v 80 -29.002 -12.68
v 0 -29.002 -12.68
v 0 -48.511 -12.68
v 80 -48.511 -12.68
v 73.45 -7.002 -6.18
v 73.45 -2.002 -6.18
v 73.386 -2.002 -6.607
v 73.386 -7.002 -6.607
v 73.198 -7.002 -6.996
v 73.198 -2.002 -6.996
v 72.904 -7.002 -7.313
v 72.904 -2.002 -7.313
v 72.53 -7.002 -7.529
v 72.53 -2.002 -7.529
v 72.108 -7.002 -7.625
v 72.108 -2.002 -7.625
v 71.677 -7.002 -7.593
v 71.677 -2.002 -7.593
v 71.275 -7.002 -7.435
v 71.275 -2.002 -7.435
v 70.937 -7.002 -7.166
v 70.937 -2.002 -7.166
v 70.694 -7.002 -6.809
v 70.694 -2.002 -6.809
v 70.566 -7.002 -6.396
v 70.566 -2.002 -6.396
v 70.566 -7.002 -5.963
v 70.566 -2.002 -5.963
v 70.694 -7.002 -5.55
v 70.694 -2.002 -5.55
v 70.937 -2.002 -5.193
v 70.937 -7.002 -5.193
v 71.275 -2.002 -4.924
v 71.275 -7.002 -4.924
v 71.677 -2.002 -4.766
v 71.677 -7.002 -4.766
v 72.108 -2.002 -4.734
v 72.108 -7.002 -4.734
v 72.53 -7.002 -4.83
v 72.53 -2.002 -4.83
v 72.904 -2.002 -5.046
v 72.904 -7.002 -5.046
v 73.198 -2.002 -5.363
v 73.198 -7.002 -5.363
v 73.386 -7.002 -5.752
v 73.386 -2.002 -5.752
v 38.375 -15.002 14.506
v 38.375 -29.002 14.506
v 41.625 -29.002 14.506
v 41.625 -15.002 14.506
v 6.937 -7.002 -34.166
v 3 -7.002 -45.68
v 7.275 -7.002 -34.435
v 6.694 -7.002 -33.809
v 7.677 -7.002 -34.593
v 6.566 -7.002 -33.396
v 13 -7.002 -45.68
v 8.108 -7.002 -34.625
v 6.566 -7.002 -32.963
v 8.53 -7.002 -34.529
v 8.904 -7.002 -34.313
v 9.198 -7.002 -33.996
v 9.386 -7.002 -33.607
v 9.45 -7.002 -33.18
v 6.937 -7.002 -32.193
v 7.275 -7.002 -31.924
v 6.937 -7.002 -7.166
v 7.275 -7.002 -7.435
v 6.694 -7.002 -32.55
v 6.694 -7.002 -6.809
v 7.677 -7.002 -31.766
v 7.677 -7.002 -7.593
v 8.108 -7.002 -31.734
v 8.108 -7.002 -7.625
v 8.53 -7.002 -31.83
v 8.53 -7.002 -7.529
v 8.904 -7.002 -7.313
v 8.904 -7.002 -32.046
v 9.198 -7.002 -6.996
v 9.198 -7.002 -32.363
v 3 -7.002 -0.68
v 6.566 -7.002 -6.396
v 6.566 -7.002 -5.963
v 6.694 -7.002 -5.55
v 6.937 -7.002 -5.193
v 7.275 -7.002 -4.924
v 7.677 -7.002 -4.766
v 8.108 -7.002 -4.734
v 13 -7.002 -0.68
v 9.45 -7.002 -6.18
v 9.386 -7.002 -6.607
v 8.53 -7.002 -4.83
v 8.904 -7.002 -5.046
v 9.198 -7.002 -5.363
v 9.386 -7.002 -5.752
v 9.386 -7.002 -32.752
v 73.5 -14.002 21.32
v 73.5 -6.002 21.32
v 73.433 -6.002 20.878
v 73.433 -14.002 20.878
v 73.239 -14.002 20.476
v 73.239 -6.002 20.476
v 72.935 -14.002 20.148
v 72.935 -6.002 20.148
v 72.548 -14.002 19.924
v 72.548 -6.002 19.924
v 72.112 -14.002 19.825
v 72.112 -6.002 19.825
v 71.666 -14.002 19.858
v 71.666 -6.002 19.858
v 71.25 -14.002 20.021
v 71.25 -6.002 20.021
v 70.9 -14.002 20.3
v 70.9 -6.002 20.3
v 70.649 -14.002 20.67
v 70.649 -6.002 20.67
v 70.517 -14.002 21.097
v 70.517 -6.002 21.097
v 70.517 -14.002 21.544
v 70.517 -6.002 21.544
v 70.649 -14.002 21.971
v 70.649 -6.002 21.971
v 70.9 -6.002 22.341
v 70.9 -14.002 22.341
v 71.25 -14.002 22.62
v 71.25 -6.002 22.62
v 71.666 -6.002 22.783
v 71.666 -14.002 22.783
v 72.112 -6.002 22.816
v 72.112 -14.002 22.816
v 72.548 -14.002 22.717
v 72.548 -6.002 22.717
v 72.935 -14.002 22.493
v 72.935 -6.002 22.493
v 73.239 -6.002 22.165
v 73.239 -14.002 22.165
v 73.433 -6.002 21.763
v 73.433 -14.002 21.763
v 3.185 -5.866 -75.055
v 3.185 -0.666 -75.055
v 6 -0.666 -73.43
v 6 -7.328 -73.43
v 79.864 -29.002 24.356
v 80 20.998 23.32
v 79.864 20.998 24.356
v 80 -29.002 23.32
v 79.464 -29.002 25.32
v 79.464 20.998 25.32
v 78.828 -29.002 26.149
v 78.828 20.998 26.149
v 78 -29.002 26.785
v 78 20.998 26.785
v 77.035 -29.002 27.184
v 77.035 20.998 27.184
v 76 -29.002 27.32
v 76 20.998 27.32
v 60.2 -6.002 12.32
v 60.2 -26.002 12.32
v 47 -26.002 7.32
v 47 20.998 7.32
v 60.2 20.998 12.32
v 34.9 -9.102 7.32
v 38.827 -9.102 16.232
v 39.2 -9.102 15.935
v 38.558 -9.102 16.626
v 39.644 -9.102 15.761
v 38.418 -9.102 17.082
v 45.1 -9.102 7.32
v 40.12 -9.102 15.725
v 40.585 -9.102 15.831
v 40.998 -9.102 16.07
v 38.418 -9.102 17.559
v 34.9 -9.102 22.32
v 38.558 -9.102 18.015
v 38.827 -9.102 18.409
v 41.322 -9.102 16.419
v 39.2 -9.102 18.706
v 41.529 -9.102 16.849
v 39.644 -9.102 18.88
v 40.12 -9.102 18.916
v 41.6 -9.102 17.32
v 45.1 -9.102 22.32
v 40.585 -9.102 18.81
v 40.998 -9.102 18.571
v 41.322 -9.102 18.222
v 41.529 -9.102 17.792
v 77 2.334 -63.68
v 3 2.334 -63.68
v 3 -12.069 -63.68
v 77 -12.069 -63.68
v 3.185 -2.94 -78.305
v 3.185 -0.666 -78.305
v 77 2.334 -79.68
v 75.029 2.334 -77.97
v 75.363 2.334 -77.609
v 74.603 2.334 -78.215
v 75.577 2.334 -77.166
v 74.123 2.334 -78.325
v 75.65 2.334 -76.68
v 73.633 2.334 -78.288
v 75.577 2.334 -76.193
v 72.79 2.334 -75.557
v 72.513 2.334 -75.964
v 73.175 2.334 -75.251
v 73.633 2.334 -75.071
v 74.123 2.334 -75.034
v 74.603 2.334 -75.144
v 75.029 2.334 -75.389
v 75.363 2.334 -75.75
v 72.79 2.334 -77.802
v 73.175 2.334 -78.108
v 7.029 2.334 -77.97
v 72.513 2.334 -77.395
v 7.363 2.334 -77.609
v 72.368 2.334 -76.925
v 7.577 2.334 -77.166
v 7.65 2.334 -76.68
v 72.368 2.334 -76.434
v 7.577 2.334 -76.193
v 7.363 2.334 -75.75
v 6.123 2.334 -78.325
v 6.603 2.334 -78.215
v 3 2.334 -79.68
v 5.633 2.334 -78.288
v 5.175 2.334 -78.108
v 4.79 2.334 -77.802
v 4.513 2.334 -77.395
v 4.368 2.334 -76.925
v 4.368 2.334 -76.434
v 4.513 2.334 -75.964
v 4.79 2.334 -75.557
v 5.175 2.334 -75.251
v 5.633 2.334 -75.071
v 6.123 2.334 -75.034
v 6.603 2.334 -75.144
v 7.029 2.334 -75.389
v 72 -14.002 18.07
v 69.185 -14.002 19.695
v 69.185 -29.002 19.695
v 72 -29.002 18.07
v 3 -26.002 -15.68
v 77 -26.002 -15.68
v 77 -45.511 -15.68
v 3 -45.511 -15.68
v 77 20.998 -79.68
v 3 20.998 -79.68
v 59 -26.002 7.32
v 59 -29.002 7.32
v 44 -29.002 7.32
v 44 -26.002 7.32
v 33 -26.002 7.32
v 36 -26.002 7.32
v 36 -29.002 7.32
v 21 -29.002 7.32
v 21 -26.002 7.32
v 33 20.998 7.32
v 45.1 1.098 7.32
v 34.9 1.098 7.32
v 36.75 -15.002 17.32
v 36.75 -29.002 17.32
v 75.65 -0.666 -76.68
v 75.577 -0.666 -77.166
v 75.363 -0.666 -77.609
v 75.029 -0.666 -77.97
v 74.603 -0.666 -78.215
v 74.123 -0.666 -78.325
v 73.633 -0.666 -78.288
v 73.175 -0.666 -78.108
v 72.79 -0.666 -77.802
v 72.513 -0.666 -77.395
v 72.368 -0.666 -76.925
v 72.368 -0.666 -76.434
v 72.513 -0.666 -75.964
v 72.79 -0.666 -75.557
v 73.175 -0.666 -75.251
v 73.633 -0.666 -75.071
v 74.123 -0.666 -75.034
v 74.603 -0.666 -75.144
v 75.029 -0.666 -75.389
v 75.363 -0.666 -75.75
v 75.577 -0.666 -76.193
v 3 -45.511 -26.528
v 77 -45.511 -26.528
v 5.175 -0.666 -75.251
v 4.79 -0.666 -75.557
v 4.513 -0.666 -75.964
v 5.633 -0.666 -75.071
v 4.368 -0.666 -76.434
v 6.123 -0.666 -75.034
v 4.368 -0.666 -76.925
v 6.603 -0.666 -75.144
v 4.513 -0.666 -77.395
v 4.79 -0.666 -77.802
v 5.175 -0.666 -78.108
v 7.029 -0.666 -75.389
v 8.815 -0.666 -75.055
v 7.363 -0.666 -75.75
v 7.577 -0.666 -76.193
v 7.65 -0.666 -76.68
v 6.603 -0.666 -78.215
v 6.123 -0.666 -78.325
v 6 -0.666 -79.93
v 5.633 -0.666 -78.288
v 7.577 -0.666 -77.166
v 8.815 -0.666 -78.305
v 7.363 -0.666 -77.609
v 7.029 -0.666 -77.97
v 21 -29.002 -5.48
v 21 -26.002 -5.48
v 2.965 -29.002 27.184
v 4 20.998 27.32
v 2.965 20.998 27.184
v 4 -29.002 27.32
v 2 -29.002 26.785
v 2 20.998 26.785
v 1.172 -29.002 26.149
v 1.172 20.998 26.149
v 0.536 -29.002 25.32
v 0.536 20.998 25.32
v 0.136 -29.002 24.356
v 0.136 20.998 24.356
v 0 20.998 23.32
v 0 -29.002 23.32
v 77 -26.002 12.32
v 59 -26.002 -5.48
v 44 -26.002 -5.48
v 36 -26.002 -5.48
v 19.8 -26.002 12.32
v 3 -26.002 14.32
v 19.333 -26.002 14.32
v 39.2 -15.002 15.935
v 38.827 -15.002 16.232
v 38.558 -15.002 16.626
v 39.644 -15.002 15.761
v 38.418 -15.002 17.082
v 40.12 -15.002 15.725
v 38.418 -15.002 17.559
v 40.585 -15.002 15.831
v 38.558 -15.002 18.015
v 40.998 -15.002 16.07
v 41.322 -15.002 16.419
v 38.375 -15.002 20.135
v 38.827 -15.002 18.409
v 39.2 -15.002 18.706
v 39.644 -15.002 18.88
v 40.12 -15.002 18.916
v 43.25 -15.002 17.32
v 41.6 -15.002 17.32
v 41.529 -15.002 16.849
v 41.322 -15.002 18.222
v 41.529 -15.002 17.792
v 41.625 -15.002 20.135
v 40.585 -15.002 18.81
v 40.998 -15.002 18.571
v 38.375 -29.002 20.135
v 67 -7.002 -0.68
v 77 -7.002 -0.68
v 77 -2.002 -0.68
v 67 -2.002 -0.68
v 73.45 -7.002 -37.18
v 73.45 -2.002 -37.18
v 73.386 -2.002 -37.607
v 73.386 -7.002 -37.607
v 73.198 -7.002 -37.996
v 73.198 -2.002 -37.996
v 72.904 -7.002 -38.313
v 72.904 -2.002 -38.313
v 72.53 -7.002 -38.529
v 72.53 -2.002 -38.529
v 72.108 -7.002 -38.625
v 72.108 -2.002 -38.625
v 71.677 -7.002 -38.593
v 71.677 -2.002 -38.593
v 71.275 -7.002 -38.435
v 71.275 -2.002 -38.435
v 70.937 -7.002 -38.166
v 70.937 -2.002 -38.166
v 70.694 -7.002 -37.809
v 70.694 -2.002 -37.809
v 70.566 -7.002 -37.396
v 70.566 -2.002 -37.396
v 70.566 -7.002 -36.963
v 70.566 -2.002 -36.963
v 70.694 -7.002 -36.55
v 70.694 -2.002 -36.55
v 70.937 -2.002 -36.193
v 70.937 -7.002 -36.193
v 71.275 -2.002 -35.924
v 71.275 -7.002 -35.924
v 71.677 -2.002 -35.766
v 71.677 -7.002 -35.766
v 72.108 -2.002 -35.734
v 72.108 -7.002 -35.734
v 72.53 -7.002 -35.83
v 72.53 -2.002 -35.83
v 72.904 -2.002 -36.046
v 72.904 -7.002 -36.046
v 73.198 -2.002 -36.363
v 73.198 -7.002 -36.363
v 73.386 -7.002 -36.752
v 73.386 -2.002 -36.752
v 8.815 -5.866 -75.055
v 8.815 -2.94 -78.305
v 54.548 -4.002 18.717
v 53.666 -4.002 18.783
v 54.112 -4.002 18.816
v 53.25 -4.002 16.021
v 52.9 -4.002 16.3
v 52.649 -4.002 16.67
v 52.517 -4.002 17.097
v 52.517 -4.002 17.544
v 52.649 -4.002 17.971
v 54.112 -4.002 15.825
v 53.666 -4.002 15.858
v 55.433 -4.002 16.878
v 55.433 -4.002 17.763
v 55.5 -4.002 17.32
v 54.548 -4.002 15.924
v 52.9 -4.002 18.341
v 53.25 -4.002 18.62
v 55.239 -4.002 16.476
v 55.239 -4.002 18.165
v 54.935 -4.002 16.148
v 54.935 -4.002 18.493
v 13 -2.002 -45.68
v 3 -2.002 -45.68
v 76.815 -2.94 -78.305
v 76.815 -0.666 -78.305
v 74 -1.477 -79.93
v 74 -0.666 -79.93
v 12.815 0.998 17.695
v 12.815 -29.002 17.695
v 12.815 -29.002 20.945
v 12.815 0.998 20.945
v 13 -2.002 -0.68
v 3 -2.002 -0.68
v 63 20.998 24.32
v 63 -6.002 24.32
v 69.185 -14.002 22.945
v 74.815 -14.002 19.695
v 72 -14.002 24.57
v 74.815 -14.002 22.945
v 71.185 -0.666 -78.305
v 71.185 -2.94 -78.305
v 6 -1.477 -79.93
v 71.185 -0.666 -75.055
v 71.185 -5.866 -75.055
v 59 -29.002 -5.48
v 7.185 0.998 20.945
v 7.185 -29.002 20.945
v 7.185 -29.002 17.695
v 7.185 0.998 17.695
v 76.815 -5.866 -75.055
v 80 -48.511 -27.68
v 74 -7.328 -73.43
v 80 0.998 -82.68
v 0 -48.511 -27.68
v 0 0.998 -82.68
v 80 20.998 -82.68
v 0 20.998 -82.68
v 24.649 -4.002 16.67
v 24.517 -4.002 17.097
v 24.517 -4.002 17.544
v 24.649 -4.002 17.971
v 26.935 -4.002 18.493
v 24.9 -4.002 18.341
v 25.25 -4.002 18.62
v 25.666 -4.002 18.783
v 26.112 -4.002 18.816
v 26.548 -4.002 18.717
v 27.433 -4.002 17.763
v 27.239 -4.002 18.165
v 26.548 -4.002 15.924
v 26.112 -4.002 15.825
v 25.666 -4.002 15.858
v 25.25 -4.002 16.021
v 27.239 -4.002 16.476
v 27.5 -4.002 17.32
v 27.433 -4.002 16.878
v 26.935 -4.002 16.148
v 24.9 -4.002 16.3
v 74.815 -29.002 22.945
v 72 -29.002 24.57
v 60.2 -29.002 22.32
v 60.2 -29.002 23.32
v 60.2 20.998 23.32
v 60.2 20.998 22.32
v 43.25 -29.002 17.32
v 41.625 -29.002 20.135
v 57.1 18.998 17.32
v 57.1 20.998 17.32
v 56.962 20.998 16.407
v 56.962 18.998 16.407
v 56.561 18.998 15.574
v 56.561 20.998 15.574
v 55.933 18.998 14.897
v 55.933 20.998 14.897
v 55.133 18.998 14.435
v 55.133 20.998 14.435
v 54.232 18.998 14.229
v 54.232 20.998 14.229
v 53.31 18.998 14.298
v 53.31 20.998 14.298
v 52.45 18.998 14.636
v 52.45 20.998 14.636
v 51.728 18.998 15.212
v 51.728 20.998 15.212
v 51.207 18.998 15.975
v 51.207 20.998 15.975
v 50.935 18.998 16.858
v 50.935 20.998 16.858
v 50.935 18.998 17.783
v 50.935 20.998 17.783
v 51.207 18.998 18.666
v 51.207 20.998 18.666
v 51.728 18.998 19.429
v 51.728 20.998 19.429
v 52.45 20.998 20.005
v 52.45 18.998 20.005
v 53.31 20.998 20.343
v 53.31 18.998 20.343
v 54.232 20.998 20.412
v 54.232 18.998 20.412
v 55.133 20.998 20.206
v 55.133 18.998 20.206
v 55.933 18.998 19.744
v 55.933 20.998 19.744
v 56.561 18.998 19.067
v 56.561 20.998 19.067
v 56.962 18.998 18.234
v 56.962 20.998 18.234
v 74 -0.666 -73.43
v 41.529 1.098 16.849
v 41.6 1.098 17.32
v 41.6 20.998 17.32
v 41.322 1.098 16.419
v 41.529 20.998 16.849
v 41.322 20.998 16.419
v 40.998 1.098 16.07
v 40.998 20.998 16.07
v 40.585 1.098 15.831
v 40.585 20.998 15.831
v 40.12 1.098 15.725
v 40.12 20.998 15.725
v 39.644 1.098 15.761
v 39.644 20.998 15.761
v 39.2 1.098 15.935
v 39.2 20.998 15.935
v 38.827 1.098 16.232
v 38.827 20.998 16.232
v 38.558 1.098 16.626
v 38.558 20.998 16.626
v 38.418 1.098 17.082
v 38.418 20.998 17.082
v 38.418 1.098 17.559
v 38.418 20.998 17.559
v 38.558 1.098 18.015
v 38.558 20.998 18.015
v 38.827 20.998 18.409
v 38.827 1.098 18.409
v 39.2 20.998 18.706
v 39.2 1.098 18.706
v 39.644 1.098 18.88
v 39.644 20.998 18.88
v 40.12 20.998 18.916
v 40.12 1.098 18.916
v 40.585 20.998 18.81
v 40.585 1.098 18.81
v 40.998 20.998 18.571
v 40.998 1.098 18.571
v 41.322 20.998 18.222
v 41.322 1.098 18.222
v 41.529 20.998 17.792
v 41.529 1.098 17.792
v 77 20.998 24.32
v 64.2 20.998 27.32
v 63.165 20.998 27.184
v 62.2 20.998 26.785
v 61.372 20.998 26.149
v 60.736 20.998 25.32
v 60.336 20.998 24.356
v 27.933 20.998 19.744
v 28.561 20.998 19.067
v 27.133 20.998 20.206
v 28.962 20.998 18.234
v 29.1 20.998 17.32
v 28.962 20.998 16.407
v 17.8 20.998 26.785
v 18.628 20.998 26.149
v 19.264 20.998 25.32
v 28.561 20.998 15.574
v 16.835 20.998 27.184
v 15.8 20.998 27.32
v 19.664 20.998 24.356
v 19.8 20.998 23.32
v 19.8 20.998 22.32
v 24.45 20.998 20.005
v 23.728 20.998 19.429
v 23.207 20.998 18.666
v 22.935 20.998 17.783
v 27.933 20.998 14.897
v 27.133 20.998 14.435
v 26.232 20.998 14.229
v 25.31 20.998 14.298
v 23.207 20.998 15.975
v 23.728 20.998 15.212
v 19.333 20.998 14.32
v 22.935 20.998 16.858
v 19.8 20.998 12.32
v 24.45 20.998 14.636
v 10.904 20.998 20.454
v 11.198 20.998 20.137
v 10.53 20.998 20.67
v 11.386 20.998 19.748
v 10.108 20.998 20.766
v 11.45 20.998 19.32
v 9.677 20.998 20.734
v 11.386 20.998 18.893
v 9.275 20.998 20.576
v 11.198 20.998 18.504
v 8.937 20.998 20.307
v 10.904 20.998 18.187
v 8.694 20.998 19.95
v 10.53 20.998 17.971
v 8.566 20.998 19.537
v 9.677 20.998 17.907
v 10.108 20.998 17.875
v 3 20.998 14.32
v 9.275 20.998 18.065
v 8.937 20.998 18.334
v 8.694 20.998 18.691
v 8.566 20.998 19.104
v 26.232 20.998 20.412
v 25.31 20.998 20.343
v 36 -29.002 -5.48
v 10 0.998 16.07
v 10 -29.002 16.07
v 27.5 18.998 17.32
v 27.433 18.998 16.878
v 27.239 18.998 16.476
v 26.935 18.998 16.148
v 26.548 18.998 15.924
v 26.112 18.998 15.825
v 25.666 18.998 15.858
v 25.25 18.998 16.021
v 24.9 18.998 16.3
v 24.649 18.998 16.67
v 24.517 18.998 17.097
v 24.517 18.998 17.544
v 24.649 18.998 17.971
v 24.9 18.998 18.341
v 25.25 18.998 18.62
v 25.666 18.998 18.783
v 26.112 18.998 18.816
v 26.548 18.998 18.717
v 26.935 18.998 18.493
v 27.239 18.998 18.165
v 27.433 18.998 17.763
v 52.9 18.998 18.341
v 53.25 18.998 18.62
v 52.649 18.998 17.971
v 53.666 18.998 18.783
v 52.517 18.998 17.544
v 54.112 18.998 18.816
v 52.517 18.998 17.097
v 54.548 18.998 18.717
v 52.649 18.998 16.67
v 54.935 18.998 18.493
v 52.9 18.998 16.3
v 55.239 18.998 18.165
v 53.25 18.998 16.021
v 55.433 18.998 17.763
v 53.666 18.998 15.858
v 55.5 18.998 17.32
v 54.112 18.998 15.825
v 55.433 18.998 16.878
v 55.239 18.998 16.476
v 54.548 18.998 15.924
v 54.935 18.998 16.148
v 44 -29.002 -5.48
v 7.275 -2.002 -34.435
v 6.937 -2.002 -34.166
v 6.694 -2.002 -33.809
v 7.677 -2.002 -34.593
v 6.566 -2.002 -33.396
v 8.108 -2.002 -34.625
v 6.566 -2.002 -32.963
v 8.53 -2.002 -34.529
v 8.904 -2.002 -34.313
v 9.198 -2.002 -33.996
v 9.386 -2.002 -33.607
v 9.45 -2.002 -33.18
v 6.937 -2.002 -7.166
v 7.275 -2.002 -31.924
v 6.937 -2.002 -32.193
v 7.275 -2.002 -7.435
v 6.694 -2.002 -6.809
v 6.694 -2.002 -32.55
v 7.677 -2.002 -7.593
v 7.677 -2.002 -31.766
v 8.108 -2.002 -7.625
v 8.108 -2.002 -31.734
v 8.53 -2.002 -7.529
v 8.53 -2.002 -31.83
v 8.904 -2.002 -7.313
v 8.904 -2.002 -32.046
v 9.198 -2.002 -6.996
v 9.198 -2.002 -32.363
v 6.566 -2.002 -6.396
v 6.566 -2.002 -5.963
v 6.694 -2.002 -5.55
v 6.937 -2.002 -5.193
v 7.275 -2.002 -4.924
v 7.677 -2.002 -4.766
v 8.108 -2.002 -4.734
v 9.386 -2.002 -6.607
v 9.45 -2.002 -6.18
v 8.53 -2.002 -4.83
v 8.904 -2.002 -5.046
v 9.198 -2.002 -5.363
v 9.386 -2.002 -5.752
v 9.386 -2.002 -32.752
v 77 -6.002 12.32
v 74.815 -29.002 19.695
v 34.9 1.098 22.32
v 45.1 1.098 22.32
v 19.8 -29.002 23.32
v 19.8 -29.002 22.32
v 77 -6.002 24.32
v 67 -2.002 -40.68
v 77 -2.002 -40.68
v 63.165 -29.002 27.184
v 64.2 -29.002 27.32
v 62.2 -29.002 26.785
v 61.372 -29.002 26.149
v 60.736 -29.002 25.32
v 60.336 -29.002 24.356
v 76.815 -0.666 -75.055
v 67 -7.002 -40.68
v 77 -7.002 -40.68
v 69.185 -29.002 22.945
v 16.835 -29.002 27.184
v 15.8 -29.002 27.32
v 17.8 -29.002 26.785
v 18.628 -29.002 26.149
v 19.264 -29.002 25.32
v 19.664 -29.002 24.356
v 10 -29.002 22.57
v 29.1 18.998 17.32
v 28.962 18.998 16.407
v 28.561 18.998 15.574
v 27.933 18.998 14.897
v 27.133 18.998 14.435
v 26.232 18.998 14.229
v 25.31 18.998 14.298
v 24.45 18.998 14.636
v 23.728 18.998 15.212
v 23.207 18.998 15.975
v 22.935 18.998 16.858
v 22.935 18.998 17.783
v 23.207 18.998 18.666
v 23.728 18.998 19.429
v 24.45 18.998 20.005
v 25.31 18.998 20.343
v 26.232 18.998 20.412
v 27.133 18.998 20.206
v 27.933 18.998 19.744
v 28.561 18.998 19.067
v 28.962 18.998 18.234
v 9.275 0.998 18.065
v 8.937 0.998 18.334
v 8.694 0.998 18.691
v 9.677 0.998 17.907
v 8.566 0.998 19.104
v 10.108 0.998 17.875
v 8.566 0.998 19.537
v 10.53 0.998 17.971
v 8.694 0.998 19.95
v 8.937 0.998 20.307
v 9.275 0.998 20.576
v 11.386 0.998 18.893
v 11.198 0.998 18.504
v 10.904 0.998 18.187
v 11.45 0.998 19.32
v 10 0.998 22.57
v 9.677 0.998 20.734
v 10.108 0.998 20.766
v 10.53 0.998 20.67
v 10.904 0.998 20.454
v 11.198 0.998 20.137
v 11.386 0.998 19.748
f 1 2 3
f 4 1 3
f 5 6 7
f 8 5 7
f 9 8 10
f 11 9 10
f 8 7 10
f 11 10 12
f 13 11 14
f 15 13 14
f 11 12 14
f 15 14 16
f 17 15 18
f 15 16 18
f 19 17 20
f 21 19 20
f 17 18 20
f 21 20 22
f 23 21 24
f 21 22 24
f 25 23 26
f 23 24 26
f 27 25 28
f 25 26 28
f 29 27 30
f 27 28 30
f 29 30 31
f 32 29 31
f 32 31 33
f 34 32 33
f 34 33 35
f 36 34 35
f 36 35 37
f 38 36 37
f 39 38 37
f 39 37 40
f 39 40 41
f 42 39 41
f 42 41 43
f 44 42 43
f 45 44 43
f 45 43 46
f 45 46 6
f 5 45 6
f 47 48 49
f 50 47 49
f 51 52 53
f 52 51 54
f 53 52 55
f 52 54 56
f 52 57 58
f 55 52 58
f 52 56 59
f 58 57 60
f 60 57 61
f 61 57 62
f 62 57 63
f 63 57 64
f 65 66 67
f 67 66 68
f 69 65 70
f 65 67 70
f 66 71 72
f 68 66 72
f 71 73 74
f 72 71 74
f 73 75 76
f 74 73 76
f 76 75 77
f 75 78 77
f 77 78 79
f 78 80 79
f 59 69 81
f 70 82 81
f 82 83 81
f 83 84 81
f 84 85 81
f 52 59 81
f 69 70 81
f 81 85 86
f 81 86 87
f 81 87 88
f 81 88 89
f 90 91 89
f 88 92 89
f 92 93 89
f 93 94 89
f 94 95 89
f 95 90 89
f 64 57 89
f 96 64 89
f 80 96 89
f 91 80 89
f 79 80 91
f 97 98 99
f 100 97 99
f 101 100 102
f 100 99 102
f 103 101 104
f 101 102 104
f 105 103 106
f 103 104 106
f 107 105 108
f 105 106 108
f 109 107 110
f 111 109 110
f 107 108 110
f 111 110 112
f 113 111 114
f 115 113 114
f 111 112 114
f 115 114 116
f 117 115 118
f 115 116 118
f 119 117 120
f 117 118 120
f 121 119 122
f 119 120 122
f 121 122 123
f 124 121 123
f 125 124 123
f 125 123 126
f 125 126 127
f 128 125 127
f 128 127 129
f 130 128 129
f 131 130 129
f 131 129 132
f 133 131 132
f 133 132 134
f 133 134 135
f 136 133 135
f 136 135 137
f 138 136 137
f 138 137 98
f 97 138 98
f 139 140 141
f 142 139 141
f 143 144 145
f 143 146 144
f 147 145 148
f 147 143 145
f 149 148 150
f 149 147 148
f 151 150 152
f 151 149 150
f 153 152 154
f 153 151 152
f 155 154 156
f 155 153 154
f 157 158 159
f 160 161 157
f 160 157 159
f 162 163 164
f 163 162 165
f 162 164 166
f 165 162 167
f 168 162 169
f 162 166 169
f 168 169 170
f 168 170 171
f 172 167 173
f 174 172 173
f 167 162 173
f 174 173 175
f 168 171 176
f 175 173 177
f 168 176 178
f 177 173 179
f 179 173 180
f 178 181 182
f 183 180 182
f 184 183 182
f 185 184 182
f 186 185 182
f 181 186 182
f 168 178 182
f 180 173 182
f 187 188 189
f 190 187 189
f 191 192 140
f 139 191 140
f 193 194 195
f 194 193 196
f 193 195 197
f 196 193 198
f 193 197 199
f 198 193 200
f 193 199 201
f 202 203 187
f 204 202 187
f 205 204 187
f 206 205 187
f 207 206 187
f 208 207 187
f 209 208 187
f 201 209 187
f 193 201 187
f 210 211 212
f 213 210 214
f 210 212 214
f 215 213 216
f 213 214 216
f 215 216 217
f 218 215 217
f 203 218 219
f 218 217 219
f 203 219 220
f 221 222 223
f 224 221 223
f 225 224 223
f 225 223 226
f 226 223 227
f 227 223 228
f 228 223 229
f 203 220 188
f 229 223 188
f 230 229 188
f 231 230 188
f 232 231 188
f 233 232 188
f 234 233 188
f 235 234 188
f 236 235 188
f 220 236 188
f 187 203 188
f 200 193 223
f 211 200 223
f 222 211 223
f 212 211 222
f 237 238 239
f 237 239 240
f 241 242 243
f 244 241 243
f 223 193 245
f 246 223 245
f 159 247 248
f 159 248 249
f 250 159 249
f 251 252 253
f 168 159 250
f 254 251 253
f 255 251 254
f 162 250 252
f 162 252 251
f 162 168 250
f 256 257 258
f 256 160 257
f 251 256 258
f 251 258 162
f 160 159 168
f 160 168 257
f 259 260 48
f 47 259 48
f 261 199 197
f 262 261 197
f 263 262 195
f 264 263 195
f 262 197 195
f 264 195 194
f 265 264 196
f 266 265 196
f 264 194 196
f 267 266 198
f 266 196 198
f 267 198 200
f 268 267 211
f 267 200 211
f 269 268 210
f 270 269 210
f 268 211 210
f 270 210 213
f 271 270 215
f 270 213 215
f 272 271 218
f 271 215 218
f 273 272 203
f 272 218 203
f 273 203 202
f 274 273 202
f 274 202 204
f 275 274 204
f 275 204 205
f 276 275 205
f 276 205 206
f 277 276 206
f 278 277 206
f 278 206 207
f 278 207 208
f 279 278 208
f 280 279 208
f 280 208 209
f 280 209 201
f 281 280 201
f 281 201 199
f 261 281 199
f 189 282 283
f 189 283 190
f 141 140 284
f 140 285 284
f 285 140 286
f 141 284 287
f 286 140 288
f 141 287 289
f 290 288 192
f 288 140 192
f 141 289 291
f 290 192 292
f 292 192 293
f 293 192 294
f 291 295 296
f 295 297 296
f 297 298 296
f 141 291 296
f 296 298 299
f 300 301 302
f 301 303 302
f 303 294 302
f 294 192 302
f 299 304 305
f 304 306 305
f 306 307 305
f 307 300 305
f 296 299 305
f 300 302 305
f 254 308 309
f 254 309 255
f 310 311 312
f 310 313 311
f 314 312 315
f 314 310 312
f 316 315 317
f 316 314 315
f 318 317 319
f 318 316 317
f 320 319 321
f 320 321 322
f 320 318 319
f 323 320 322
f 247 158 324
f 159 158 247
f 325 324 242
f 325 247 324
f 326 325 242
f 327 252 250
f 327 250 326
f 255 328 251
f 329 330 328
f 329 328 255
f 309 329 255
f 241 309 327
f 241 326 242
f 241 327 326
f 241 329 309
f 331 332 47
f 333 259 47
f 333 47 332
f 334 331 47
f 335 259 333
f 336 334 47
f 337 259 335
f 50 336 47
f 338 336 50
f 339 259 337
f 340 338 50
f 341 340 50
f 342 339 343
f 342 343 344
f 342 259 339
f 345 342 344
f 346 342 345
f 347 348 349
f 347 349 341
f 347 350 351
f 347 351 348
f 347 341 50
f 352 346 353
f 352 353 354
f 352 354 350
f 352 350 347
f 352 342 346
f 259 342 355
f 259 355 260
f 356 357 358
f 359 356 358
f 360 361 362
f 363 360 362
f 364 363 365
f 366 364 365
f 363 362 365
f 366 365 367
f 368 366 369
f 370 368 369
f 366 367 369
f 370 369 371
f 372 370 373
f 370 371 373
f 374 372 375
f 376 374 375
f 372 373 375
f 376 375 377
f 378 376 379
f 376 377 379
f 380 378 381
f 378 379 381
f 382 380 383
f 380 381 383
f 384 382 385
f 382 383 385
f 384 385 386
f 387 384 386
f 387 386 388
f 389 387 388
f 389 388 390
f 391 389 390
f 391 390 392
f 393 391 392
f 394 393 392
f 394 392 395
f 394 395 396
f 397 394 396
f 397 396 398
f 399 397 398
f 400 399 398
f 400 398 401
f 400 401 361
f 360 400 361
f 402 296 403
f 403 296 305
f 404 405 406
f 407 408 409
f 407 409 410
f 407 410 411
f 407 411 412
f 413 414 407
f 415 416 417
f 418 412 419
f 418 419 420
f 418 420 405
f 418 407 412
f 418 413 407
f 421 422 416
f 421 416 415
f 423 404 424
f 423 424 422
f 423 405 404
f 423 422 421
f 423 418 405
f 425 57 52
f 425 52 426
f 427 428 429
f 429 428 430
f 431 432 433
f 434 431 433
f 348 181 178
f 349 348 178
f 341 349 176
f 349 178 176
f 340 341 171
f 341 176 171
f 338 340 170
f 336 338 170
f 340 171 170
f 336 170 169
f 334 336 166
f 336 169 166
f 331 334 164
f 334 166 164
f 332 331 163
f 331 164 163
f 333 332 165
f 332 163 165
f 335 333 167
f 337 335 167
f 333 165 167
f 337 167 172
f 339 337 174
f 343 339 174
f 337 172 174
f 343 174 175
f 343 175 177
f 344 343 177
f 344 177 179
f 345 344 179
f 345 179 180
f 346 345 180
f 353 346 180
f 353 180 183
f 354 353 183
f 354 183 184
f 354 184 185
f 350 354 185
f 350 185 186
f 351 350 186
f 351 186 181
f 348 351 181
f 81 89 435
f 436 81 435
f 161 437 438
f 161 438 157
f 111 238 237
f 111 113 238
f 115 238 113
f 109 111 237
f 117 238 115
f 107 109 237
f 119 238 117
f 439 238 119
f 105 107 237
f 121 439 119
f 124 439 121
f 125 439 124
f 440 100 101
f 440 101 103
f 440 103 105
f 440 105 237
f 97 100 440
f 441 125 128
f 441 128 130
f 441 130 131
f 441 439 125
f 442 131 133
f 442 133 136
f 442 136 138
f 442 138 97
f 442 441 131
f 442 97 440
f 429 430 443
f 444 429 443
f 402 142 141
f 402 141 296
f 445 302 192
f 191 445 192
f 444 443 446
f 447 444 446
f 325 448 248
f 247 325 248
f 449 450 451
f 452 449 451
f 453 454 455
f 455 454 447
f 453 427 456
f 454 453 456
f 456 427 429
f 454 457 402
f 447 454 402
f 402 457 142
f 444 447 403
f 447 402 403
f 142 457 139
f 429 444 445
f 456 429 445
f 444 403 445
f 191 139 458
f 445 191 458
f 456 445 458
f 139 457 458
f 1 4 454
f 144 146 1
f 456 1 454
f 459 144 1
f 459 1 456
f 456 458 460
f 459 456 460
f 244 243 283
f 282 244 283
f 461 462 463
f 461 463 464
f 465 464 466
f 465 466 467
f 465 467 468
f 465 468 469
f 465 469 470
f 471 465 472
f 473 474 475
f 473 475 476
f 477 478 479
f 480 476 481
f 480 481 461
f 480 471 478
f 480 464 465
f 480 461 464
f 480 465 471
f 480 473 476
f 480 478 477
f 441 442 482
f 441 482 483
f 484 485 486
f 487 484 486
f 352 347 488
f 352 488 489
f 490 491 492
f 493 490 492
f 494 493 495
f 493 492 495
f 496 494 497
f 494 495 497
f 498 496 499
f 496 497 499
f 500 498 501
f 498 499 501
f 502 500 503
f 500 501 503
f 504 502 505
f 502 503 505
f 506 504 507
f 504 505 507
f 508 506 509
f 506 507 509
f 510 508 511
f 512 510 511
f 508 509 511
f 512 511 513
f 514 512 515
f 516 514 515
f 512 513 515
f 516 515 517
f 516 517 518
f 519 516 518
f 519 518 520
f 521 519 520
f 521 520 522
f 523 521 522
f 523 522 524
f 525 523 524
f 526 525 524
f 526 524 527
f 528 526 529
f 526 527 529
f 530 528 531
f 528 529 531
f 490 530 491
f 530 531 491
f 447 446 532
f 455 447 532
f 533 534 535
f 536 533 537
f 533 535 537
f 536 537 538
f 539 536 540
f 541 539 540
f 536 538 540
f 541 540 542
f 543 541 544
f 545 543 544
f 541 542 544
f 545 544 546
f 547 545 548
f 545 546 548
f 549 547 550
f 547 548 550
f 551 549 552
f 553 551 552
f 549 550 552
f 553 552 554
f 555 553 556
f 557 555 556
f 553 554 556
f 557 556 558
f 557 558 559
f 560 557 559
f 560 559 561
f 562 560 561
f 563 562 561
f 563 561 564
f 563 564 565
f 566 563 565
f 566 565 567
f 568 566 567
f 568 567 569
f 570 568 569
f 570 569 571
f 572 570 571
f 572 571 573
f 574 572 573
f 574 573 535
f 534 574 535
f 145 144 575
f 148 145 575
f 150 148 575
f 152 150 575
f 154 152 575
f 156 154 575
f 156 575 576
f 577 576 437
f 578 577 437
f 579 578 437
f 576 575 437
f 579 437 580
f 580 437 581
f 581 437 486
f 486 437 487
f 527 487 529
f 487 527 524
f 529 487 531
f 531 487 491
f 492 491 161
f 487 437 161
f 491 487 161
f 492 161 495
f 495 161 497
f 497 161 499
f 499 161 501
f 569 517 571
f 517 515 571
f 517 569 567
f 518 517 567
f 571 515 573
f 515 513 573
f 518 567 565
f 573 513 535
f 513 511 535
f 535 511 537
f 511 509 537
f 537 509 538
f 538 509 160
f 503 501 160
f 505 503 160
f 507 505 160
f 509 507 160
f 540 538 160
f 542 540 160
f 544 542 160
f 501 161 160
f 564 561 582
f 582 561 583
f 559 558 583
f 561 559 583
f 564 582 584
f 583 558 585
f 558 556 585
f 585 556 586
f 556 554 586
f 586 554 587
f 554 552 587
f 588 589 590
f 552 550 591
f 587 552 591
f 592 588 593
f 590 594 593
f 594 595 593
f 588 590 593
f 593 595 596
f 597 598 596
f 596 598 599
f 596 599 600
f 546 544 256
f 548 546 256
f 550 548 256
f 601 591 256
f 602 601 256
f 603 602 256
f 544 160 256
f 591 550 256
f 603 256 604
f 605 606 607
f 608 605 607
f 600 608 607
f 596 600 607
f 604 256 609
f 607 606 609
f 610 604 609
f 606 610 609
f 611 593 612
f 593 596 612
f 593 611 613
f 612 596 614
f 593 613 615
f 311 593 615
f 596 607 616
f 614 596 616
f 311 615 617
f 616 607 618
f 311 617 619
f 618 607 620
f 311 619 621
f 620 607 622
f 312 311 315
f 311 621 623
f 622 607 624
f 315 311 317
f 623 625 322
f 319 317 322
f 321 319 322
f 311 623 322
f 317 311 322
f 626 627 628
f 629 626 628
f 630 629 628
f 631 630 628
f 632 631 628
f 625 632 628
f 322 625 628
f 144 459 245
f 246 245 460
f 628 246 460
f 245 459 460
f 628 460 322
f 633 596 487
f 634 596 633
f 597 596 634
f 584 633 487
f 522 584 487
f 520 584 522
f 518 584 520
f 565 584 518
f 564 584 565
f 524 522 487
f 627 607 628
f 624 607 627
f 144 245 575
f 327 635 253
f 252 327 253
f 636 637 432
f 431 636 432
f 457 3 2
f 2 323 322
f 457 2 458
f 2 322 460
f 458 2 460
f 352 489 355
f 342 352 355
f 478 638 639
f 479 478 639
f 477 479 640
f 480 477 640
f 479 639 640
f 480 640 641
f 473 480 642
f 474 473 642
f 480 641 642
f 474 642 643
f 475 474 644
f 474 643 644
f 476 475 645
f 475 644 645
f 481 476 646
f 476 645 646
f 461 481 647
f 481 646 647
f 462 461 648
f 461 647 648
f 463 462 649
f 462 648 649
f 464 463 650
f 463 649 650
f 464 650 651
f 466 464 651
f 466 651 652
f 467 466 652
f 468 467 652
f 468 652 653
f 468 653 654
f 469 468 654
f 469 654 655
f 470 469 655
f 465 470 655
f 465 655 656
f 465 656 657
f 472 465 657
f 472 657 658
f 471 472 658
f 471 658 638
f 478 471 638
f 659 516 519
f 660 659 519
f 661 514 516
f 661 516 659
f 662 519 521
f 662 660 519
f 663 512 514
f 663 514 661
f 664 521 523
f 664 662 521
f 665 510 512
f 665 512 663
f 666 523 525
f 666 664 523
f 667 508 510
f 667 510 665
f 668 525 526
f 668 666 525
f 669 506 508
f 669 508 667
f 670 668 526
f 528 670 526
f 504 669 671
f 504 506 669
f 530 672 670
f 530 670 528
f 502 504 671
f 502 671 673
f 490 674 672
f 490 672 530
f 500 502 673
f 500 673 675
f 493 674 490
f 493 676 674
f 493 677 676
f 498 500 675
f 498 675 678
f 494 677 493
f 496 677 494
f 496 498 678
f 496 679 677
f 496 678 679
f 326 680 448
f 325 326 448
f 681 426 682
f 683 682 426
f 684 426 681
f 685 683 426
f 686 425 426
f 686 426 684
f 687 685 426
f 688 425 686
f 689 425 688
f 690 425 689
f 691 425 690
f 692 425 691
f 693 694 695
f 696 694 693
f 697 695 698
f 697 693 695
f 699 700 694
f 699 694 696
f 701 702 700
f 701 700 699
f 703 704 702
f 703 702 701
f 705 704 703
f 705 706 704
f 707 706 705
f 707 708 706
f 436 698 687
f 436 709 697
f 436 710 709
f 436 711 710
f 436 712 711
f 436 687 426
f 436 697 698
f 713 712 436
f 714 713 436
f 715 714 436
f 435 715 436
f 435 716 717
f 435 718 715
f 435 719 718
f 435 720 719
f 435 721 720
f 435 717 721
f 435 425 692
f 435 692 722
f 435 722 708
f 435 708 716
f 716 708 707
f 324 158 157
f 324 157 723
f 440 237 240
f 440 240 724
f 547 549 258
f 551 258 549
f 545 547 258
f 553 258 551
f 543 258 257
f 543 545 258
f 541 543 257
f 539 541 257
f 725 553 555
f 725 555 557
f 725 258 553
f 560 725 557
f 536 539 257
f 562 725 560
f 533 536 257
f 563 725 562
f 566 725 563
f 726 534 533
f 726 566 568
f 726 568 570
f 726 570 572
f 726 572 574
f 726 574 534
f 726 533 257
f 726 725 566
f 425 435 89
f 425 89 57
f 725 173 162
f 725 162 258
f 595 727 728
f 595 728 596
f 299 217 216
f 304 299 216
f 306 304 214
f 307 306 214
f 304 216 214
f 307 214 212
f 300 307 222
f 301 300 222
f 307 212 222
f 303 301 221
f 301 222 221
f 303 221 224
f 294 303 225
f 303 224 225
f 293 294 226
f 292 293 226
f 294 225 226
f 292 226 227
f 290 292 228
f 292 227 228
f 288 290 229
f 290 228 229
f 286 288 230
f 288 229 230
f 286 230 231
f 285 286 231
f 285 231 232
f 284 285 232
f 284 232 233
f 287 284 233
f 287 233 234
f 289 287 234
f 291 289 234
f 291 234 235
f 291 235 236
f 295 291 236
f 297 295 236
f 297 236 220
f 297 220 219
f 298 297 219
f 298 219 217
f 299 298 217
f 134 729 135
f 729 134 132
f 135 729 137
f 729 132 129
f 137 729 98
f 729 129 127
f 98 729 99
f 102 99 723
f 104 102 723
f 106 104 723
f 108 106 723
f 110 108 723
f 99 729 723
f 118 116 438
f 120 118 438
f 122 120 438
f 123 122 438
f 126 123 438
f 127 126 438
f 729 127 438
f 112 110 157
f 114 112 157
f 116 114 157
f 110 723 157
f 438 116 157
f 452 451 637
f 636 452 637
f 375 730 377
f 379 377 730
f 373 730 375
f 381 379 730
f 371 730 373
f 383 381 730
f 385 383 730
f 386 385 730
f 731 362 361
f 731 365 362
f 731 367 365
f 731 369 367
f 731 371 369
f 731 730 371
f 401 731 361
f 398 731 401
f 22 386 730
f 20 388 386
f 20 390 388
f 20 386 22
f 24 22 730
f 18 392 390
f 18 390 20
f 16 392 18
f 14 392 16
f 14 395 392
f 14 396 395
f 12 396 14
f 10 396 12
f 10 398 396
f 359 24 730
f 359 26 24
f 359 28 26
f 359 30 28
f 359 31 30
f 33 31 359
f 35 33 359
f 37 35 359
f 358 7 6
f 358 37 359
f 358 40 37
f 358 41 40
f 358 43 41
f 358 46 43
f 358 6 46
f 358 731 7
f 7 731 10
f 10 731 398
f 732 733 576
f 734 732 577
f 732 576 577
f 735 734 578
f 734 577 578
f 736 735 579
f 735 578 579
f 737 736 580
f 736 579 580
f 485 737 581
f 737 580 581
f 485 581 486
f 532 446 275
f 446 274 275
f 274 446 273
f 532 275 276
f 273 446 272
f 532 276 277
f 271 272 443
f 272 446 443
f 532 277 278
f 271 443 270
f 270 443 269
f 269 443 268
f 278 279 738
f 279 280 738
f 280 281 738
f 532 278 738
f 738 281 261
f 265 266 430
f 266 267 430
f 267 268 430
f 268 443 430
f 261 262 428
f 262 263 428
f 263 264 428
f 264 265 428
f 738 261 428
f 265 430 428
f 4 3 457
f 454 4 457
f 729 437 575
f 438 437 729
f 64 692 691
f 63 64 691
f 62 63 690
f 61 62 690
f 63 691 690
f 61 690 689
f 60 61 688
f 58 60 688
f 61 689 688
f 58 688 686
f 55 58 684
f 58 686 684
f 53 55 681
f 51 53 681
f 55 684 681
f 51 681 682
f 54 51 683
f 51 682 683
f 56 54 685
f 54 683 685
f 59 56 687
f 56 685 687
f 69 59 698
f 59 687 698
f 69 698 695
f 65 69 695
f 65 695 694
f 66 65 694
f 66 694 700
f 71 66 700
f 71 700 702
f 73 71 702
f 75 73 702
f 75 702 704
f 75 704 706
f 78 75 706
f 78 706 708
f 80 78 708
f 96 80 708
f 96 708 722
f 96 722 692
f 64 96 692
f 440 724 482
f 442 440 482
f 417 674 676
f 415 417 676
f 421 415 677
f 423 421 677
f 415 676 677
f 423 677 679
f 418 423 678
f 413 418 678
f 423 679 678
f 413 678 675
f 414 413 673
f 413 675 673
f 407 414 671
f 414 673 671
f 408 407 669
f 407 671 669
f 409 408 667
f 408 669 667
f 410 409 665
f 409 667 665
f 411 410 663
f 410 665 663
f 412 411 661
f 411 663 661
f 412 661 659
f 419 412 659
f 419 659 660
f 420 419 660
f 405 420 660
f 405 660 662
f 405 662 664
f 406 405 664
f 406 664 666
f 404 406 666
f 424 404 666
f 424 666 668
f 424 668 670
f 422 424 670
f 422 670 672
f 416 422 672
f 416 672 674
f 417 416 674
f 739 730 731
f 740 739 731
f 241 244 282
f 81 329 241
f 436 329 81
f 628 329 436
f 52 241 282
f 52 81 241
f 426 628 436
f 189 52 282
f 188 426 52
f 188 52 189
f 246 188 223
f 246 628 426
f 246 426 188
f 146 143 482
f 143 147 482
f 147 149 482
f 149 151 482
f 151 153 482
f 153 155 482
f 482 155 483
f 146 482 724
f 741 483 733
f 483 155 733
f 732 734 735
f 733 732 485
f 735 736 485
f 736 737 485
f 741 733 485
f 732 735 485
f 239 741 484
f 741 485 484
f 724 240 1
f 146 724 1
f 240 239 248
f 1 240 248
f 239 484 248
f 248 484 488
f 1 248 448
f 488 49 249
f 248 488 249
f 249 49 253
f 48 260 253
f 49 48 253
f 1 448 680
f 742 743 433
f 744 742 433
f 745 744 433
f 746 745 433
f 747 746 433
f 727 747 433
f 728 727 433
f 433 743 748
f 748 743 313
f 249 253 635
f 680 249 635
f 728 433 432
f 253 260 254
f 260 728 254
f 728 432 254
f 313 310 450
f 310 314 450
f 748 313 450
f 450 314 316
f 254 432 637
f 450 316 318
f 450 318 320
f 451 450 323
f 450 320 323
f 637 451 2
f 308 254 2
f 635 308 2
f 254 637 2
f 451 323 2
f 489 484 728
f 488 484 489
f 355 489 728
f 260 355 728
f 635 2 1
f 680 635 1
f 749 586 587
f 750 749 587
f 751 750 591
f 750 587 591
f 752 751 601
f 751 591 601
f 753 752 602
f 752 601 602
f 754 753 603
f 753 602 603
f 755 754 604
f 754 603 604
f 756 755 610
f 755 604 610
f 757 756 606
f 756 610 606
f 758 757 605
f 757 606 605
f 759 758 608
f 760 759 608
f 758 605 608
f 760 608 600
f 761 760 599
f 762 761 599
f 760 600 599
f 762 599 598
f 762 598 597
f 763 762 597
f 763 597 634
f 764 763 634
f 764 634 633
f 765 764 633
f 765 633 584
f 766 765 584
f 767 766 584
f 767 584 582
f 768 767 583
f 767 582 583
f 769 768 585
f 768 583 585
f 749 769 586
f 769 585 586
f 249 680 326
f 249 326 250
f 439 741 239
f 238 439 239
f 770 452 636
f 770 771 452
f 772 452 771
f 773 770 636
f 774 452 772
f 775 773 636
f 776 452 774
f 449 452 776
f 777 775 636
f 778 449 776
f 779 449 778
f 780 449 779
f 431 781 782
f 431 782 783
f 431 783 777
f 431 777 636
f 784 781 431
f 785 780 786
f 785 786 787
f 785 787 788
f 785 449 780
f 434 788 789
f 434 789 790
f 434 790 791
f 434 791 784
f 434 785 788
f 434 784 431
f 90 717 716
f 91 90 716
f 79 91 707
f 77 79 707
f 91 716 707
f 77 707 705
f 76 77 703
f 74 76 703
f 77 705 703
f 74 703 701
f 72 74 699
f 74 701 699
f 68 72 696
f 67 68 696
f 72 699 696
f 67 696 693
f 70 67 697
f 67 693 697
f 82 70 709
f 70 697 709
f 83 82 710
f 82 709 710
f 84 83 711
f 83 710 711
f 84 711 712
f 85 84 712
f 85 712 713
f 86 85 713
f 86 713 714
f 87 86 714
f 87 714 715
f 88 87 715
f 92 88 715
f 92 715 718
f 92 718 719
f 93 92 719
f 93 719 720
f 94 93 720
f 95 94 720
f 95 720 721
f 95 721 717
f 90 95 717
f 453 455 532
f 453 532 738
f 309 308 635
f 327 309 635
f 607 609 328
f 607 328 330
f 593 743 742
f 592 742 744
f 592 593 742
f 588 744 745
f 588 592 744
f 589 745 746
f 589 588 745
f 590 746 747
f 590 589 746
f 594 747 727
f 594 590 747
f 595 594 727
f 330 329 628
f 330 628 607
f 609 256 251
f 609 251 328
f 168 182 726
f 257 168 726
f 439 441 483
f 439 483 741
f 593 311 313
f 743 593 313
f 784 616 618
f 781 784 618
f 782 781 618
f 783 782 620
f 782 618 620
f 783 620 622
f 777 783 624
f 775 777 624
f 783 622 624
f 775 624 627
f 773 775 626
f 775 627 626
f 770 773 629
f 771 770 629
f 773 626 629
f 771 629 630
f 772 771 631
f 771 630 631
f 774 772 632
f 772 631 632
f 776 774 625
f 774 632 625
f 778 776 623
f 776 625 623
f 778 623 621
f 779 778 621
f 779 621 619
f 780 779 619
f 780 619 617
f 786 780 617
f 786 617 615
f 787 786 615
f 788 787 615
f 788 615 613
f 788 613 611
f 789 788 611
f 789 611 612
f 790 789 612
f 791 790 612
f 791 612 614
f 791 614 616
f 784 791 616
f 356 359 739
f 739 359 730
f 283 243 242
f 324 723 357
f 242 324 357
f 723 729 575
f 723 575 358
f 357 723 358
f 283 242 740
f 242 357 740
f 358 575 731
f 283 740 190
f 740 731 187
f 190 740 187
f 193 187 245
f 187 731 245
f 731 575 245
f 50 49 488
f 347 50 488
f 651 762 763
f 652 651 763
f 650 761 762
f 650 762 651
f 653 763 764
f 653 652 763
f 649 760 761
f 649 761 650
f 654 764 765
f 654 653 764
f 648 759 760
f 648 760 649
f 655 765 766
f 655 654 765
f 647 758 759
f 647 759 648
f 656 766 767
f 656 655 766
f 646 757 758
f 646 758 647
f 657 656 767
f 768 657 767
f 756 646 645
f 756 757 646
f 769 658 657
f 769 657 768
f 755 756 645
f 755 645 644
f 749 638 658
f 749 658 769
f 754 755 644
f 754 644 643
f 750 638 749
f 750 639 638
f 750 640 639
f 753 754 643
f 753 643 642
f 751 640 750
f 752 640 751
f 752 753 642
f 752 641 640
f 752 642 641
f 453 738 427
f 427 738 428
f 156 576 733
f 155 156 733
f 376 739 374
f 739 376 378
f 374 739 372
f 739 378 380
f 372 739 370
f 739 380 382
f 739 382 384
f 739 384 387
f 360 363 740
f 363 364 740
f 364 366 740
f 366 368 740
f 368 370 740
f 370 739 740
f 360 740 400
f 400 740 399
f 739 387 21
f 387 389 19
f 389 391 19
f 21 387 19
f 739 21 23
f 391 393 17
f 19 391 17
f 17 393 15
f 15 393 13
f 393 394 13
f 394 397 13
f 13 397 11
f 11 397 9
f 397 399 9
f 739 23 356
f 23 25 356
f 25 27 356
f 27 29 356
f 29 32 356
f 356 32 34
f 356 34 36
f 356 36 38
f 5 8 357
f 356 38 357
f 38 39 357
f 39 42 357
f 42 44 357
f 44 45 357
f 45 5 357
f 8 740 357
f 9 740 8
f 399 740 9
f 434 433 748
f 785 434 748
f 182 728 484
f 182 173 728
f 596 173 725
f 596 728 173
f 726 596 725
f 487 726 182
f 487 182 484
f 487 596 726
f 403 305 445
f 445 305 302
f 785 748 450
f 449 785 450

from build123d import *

# Parameters (mm, degrees)
BOSS_EXTRUDE1_DEPTH = 80
SHELL1_T            = -3
SKETCH3_W           = 46
SKETCH3_H           = 47
BOSS_EXTRUDE2_DEPTH = 17
SKETCH4_W           = 10.2
SKETCH4_H           = 10.2
CUT_EXTRUDE1_DEPTH  = 20
SKETCH6_W           = 15
SKETCH6_H           = 12.8
CUT_EXTRUDE2_DEPTH  = 3
SKETCH7_W           = 40.4
SKETCH7_H           = 50
CUT_EXTRUDE3_DEPTH  = 5
FILLET1_R           = 4
CUT_EXTRUDE7_DEPTH  = 47
SKETCH13_R          = 1.5
CUT_EXTRUDE8_DEPTH  = 25
SKETCH14_R          = 3.1
CUT_EXTRUDE9_DEPTH  = 2
SKETCH17_W          = 45
SKETCH17_H          = 5
BOSS_EXTRUDE5_DEPTH = 74
CUT_EXTRUDE10_REACH = 48.51
SKETCH18_W          = 54
SKETCH18_H          = 45
CUT_EXTRUDE11_REACH = 48.51
SKETCH19_R          = 1.45
BOSS_EXTRUDE6_DEPTH = 47
SKETCH22_R          = 1.45
CUT_EXTRUDE12_DEPTH = 70.509632224
BOSS_EXTRUDE7_DEPTH = 74
SKETCH27_R          = 1.65
CUT_EXTRUDE14_DEPTH = 10
CUT_EXTRUDE15_START = -3
CUT_EXTRUDE15_DEPTH = 32
CUT_EXTRUDE16_DEPTH = 30
BOSS_EXTRUDE8_DEPTH = 20
SKETCH31_R          = 1.5
CUT_EXTRUDE17_DEPTH = 43.509632224
CUT_EXTRUDE18_DEPTH = 15
CUT_EXTRUDE19_REACH = 48.51
SKETCH33_W          = 10
SKETCH33_H          = 5
SKETCH34_R          = 1.6
CUT_EXTRUDE20_DEPTH = 70.509632224
CUT_EXTRUDE22_DEPTH = 14


with BuildPart() as part:
    # Sketch2 → Boss-Extrude1 (new body)
    with BuildSketch(Plane(origin=(0, 0, 0), x_dir=(0, 0, -1), z_dir=(1, 0, 0))):
        Polygon((-27.320490368, 20.998248687), (-27.320490368, -29.001751313), (12.679509632, -29.001751313), (12.679509632, -48.511383538), (27.679509632, -48.511383538), (82.679509632, 0.998248687), (82.679509632, 20.998248687), align=None)
    extrude(amount=BOSS_EXTRUDE1_DEPTH)

    # Shell1
    shell1_openings = [part.faces().sort_by_distance(p)[0] for p in [
        (40, 20.998248687, -27.679509632),
    ]]
    offset(amount=SHELL1_T, openings=shell1_openings, kind=Kind.INTERSECTION)

    # Sketch3 → Boss-Extrude2 (add)
    with BuildSketch(Plane(origin=(0, 0, 24.320490368), x_dir=(-1, 0, 0), z_dir=(0, 0, -1))):
        with Locations((-40, -2.501751313)):
            Rectangle(SKETCH3_W, SKETCH3_H)
    extrude(amount=BOSS_EXTRUDE2_DEPTH)

    # Sketch4 → Cut-Extrude1 (cut)
    with BuildSketch(Plane.XY.offset(27.320490368)):
        with Locations((40, -4.001751313)):
            Rectangle(SKETCH4_W, SKETCH4_H)
    extrude(amount=-CUT_EXTRUDE1_DEPTH, mode=Mode.SUBTRACT)

    # Sketch6 → Cut-Extrude2 (cut)
    with BuildSketch(Plane.XZ.offset(29.001751313)):
        with Locations((51.5, 0.920490368)):
            Rectangle(SKETCH6_W, SKETCH6_H)
        with Locations((28.5, 0.920490368)):
            Rectangle(SKETCH6_W, SKETCH6_H)
    extrude(amount=-CUT_EXTRUDE2_DEPTH, mode=Mode.SUBTRACT)

    # Sketch7 → Cut-Extrude3 (cut)
    with BuildSketch(Plane.XY.offset(27.320490368)):
        with Locations((40, -4.001751313)):
            Rectangle(SKETCH7_W, SKETCH7_H)
    extrude(amount=-CUT_EXTRUDE3_DEPTH, mode=Mode.SUBTRACT)

    # Fillet1
    fillet1_edges = [part.edges().sort_by_distance(p)[0] for p in [
        (19.8, -4.001751313, 27.320490368),
        (60.2, -4.001751313, 27.320490368),
        (80, -4.001751313, 27.320490368),
        (0, -4.001751313, 27.320490368),
    ]]
    fillet(fillet1_edges, radius=FILLET1_R)

    # Sketch12 → Cut-Extrude7 (cut)
    with BuildSketch(Plane(origin=(0, 20.998248687, 0), x_dir=(1, 0, 0), z_dir=(0, 1, 0))):
        Polygon((33, -7.320490368), (19.8, -12.320490368), (17, -24.320490368), (17, -7.320490368), align=None)
        Polygon((47, -7.320490368), (63, -7.320490368), (63, -24.320490368), (60.2, -12.320490368), align=None)
    extrude(amount=-CUT_EXTRUDE7_DEPTH, mode=Mode.SUBTRACT)

    # Sketch13 → Cut-Extrude8 (cut)
    with BuildSketch(Plane(origin=(0, 20.998248687, 0), x_dir=(1, 0, 0), z_dir=(0, 1, 0))):
        with Locations((26, -17.320490368)):
            Circle(SKETCH13_R)
        with Locations((54, -17.320490368)):
            Circle(SKETCH13_R)
    extrude(amount=-CUT_EXTRUDE8_DEPTH, mode=Mode.SUBTRACT)

    # Sketch14 → Cut-Extrude9 (cut)
    with BuildSketch(Plane(origin=(0, 20.998248687, 0), x_dir=(1, 0, 0), z_dir=(0, 1, 0))):
        with Locations((26, -17.320490368)):
            Circle(SKETCH14_R)
        with Locations((54, -17.320490368)):
            Circle(SKETCH14_R)
    extrude(amount=-CUT_EXTRUDE9_DEPTH, mode=Mode.SUBTRACT)

    # Sketch17 → Boss-Extrude5 (add)
    with BuildSketch(Plane.ZY.offset(-77)):
        with Locations((-23.179509632, -4.501751313)):
            Rectangle(SKETCH17_W, SKETCH17_H)
    extrude(amount=BOSS_EXTRUDE5_DEPTH)

    # Sketch18 → Cut-Extrude10 (cut, up to next)
    with BuildSketch(Plane(origin=(0, -2.001751313, 0), x_dir=(1, 0, 0), z_dir=(0, 1, 0)), mode=Mode.PRIVATE) as cut_extrude10_sk1:
        with Locations((40, 23.179509632)):
            Rectangle(SKETCH18_W, SKETCH18_H)
    cut_extrude10_tool1 = extrude(cut_extrude10_sk1.sketch, amount=-CUT_EXTRUDE10_REACH, mode=Mode.PRIVATE) & part.part
    add(cut_extrude10_tool1.solids().sort_by_distance((40, -2.001751, -23.17951))[0], mode=Mode.SUBTRACT)

    # Sketch19 → Cut-Extrude11 (cut, up to next)
    with BuildSketch(Plane(origin=(0, -2.001751313, 0), x_dir=(1, 0, 0), z_dir=(0, 1, 0)), mode=Mode.PRIVATE) as cut_extrude11_sk1:
        with Locations((72, 37.179509632)):
            Circle(SKETCH19_R)
    cut_extrude11_tool1 = extrude(cut_extrude11_sk1.sketch, amount=-CUT_EXTRUDE11_REACH, mode=Mode.PRIVATE) & part.part
    add(cut_extrude11_tool1.solids().sort_by_distance((72, -2.001751, -37.17951))[0], mode=Mode.SUBTRACT)
    # Sketch19 → Cut-Extrude11 (cut, up to next)
    with BuildSketch(Plane(origin=(0, -2.001751313, 0), x_dir=(1, 0, 0), z_dir=(0, 1, 0)), mode=Mode.PRIVATE) as cut_extrude11_sk2:
        with Locations((72, 6.179509632)):
            Circle(SKETCH19_R)
    cut_extrude11_tool2 = extrude(cut_extrude11_sk2.sketch, amount=-CUT_EXTRUDE11_REACH, mode=Mode.PRIVATE) & part.part
    add(cut_extrude11_tool2.solids().sort_by_distance((72, -2.001751, -6.17951))[0], mode=Mode.SUBTRACT)
    # Sketch19 → Cut-Extrude11 (cut, up to next)
    with BuildSketch(Plane(origin=(0, -2.001751313, 0), x_dir=(1, 0, 0), z_dir=(0, 1, 0)), mode=Mode.PRIVATE) as cut_extrude11_sk3:
        with Locations((8, 33.179509632)):
            Circle(SKETCH19_R)
    cut_extrude11_tool3 = extrude(cut_extrude11_sk3.sketch, amount=-CUT_EXTRUDE11_REACH, mode=Mode.PRIVATE) & part.part
    add(cut_extrude11_tool3.solids().sort_by_distance((8, -2.001751, -33.17951))[0], mode=Mode.SUBTRACT)
    # Sketch19 → Cut-Extrude11 (cut, up to next)
    with BuildSketch(Plane(origin=(0, -2.001751313, 0), x_dir=(1, 0, 0), z_dir=(0, 1, 0)), mode=Mode.PRIVATE) as cut_extrude11_sk4:
        with Locations((8, 6.179509632)):
            Circle(SKETCH19_R)
    cut_extrude11_tool4 = extrude(cut_extrude11_sk4.sketch, amount=-CUT_EXTRUDE11_REACH, mode=Mode.PRIVATE) & part.part
    add(cut_extrude11_tool4.solids().sort_by_distance((8, -2.001751, -6.17951))[0], mode=Mode.SUBTRACT)

    # Sketch21 → Boss-Extrude6 (add)
    with BuildSketch(Plane(origin=(0, -26.001751313, 0), x_dir=(1, 0, 0), z_dir=(0, 1, 0))):
        Polygon((3, -24.320490368), (3, -14.320490368), (19.333333333, -14.320490368), (17, -24.320490368), align=None)
    extrude(amount=BOSS_EXTRUDE6_DEPTH)

    # Sketch22 → Cut-Extrude12 (cut, through all)
    with BuildSketch(Plane(origin=(0, 20.998248687, 0), x_dir=(1, 0, 0), z_dir=(0, 1, 0))):
        with Locations((10, -19.320490368)):
            Circle(SKETCH22_R)
    extrude(amount=-CUT_EXTRUDE12_DEPTH, mode=Mode.SUBTRACT)

    # Sketch26 → Boss-Extrude7 (add)
    with BuildSketch(Plane(origin=(3, 0, 0), x_dir=(0, 0, -1), z_dir=(1, 0, 0))):
        Polygon((79.679509632, 2.334161996), (63.679509632, 2.334161996), (63.679509632, -12.068640106), align=None)
    extrude(amount=BOSS_EXTRUDE7_DEPTH)

    # Sketch27 → Cut-Extrude14 (cut)
    with BuildSketch(Plane(origin=(0, 2.334161996, 0), x_dir=(1, 0, 0), z_dir=(0, 1, 0))):
        with Locations((6, 76.679509632)):
            Circle(SKETCH27_R)
        with Locations((74, 76.679509632)):
            Circle(SKETCH27_R)
    extrude(amount=-CUT_EXTRUDE14_DEPTH, mode=Mode.SUBTRACT)

    # Sketch28 → Cut-Extrude15 (cut)
    with BuildSketch(Plane(origin=(0, 2.334161996, 0), x_dir=(1, 0, 0), z_dir=(0, 1, 0)).offset(CUT_EXTRUDE15_START)):
        Polygon((74, 79.929509632), (71.185417438, 78.304509632), (71.185417438, 75.054509632), (74, 73.429509632), (76.814582562, 75.054509632), (76.814582562, 78.304509632), align=None)
        Polygon((6, 73.429509632), (8.814582562, 75.054509632), (8.814582562, 78.304509632), (6, 79.929509632), (3.185417438, 78.304509632), (3.185417438, 75.054509632), align=None)
    extrude(amount=-CUT_EXTRUDE15_DEPTH, mode=Mode.SUBTRACT)

    # Sketch29 → Cut-Extrude16 (cut)
    with BuildSketch(Plane.XZ.offset(29.001751313)):
        Polygon((7.185417438, 17.695490368), (10, 16.070490368), (12.814582562, 17.695490368), (12.814582562, 20.945490368), (10, 22.570490368), (7.185417438, 20.945490368), align=None)
    extrude(amount=-CUT_EXTRUDE16_DEPTH, mode=Mode.SUBTRACT)

    # Sketch30 → Boss-Extrude8 (add)
    with BuildSketch(Plane(origin=(0, -26.001751313, 0), x_dir=(1, 0, 0), z_dir=(0, 1, 0))):
        Polygon((77, -24.320490368), (63, -24.320490368), (60.2, -12.320490368), (77, -12.320490368), align=None)
    extrude(amount=BOSS_EXTRUDE8_DEPTH)

    # Sketch31 → Cut-Extrude17 (cut, through all)
    with BuildSketch(Plane(origin=(0, -6.001751313, 0), x_dir=(1, 0, 0), z_dir=(0, 1, 0))):
        with Locations((72, -21.320490368)):
            Circle(SKETCH31_R)
    extrude(amount=-CUT_EXTRUDE17_DEPTH, mode=Mode.SUBTRACT)

    # Sketch32 → Cut-Extrude18 (cut)
    with BuildSketch(Plane.XZ.offset(29.001751313)):
        Polygon((72, 24.570490368), (69.185417438, 22.945490368), (69.185417438, 19.695490368), (72, 18.070490368), (74.814582562, 19.695490368), (74.814582562, 22.945490368), align=None)
    extrude(amount=-CUT_EXTRUDE18_DEPTH, mode=Mode.SUBTRACT)

    # Sketch33 → Cut-Extrude19 (cut, up to next)
    with BuildSketch(Plane(origin=(0, -2.001751313, 0), x_dir=(1, 0, 0), z_dir=(0, 1, 0)), mode=Mode.PRIVATE) as cut_extrude19_sk1:
        with Locations((72, 43.179509632)):
            Rectangle(SKETCH33_W, SKETCH33_H)
    cut_extrude19_tool1 = extrude(cut_extrude19_sk1.sketch, amount=-CUT_EXTRUDE19_REACH, mode=Mode.PRIVATE) & part.part
    add(cut_extrude19_tool1.solids().sort_by_distance((72, -2.001751, -43.17951))[0], mode=Mode.SUBTRACT)

    # Sketch34 → Cut-Extrude20 (cut, through all)
    with BuildSketch(Plane(origin=(0, 20.998248687, 0), x_dir=(1, 0, 0), z_dir=(0, 1, 0))):
        with Locations((40, -17.320490368)):
            Circle(SKETCH34_R)
    extrude(amount=-CUT_EXTRUDE20_DEPTH, mode=Mode.SUBTRACT)

    # Sketch36 → Cut-Extrude22 (cut)
    with BuildSketch(Plane.XZ.offset(29.001751313)):
        Polygon((38.375, 20.13507293), (36.75, 17.320490368), (38.375, 14.505907805), (41.625, 14.505907805), (43.25, 17.320490368), (41.625, 20.13507293), align=None)
    extrude(amount=-CUT_EXTRUDE22_DEPTH, mode=Mode.SUBTRACT)


solid = part.part
